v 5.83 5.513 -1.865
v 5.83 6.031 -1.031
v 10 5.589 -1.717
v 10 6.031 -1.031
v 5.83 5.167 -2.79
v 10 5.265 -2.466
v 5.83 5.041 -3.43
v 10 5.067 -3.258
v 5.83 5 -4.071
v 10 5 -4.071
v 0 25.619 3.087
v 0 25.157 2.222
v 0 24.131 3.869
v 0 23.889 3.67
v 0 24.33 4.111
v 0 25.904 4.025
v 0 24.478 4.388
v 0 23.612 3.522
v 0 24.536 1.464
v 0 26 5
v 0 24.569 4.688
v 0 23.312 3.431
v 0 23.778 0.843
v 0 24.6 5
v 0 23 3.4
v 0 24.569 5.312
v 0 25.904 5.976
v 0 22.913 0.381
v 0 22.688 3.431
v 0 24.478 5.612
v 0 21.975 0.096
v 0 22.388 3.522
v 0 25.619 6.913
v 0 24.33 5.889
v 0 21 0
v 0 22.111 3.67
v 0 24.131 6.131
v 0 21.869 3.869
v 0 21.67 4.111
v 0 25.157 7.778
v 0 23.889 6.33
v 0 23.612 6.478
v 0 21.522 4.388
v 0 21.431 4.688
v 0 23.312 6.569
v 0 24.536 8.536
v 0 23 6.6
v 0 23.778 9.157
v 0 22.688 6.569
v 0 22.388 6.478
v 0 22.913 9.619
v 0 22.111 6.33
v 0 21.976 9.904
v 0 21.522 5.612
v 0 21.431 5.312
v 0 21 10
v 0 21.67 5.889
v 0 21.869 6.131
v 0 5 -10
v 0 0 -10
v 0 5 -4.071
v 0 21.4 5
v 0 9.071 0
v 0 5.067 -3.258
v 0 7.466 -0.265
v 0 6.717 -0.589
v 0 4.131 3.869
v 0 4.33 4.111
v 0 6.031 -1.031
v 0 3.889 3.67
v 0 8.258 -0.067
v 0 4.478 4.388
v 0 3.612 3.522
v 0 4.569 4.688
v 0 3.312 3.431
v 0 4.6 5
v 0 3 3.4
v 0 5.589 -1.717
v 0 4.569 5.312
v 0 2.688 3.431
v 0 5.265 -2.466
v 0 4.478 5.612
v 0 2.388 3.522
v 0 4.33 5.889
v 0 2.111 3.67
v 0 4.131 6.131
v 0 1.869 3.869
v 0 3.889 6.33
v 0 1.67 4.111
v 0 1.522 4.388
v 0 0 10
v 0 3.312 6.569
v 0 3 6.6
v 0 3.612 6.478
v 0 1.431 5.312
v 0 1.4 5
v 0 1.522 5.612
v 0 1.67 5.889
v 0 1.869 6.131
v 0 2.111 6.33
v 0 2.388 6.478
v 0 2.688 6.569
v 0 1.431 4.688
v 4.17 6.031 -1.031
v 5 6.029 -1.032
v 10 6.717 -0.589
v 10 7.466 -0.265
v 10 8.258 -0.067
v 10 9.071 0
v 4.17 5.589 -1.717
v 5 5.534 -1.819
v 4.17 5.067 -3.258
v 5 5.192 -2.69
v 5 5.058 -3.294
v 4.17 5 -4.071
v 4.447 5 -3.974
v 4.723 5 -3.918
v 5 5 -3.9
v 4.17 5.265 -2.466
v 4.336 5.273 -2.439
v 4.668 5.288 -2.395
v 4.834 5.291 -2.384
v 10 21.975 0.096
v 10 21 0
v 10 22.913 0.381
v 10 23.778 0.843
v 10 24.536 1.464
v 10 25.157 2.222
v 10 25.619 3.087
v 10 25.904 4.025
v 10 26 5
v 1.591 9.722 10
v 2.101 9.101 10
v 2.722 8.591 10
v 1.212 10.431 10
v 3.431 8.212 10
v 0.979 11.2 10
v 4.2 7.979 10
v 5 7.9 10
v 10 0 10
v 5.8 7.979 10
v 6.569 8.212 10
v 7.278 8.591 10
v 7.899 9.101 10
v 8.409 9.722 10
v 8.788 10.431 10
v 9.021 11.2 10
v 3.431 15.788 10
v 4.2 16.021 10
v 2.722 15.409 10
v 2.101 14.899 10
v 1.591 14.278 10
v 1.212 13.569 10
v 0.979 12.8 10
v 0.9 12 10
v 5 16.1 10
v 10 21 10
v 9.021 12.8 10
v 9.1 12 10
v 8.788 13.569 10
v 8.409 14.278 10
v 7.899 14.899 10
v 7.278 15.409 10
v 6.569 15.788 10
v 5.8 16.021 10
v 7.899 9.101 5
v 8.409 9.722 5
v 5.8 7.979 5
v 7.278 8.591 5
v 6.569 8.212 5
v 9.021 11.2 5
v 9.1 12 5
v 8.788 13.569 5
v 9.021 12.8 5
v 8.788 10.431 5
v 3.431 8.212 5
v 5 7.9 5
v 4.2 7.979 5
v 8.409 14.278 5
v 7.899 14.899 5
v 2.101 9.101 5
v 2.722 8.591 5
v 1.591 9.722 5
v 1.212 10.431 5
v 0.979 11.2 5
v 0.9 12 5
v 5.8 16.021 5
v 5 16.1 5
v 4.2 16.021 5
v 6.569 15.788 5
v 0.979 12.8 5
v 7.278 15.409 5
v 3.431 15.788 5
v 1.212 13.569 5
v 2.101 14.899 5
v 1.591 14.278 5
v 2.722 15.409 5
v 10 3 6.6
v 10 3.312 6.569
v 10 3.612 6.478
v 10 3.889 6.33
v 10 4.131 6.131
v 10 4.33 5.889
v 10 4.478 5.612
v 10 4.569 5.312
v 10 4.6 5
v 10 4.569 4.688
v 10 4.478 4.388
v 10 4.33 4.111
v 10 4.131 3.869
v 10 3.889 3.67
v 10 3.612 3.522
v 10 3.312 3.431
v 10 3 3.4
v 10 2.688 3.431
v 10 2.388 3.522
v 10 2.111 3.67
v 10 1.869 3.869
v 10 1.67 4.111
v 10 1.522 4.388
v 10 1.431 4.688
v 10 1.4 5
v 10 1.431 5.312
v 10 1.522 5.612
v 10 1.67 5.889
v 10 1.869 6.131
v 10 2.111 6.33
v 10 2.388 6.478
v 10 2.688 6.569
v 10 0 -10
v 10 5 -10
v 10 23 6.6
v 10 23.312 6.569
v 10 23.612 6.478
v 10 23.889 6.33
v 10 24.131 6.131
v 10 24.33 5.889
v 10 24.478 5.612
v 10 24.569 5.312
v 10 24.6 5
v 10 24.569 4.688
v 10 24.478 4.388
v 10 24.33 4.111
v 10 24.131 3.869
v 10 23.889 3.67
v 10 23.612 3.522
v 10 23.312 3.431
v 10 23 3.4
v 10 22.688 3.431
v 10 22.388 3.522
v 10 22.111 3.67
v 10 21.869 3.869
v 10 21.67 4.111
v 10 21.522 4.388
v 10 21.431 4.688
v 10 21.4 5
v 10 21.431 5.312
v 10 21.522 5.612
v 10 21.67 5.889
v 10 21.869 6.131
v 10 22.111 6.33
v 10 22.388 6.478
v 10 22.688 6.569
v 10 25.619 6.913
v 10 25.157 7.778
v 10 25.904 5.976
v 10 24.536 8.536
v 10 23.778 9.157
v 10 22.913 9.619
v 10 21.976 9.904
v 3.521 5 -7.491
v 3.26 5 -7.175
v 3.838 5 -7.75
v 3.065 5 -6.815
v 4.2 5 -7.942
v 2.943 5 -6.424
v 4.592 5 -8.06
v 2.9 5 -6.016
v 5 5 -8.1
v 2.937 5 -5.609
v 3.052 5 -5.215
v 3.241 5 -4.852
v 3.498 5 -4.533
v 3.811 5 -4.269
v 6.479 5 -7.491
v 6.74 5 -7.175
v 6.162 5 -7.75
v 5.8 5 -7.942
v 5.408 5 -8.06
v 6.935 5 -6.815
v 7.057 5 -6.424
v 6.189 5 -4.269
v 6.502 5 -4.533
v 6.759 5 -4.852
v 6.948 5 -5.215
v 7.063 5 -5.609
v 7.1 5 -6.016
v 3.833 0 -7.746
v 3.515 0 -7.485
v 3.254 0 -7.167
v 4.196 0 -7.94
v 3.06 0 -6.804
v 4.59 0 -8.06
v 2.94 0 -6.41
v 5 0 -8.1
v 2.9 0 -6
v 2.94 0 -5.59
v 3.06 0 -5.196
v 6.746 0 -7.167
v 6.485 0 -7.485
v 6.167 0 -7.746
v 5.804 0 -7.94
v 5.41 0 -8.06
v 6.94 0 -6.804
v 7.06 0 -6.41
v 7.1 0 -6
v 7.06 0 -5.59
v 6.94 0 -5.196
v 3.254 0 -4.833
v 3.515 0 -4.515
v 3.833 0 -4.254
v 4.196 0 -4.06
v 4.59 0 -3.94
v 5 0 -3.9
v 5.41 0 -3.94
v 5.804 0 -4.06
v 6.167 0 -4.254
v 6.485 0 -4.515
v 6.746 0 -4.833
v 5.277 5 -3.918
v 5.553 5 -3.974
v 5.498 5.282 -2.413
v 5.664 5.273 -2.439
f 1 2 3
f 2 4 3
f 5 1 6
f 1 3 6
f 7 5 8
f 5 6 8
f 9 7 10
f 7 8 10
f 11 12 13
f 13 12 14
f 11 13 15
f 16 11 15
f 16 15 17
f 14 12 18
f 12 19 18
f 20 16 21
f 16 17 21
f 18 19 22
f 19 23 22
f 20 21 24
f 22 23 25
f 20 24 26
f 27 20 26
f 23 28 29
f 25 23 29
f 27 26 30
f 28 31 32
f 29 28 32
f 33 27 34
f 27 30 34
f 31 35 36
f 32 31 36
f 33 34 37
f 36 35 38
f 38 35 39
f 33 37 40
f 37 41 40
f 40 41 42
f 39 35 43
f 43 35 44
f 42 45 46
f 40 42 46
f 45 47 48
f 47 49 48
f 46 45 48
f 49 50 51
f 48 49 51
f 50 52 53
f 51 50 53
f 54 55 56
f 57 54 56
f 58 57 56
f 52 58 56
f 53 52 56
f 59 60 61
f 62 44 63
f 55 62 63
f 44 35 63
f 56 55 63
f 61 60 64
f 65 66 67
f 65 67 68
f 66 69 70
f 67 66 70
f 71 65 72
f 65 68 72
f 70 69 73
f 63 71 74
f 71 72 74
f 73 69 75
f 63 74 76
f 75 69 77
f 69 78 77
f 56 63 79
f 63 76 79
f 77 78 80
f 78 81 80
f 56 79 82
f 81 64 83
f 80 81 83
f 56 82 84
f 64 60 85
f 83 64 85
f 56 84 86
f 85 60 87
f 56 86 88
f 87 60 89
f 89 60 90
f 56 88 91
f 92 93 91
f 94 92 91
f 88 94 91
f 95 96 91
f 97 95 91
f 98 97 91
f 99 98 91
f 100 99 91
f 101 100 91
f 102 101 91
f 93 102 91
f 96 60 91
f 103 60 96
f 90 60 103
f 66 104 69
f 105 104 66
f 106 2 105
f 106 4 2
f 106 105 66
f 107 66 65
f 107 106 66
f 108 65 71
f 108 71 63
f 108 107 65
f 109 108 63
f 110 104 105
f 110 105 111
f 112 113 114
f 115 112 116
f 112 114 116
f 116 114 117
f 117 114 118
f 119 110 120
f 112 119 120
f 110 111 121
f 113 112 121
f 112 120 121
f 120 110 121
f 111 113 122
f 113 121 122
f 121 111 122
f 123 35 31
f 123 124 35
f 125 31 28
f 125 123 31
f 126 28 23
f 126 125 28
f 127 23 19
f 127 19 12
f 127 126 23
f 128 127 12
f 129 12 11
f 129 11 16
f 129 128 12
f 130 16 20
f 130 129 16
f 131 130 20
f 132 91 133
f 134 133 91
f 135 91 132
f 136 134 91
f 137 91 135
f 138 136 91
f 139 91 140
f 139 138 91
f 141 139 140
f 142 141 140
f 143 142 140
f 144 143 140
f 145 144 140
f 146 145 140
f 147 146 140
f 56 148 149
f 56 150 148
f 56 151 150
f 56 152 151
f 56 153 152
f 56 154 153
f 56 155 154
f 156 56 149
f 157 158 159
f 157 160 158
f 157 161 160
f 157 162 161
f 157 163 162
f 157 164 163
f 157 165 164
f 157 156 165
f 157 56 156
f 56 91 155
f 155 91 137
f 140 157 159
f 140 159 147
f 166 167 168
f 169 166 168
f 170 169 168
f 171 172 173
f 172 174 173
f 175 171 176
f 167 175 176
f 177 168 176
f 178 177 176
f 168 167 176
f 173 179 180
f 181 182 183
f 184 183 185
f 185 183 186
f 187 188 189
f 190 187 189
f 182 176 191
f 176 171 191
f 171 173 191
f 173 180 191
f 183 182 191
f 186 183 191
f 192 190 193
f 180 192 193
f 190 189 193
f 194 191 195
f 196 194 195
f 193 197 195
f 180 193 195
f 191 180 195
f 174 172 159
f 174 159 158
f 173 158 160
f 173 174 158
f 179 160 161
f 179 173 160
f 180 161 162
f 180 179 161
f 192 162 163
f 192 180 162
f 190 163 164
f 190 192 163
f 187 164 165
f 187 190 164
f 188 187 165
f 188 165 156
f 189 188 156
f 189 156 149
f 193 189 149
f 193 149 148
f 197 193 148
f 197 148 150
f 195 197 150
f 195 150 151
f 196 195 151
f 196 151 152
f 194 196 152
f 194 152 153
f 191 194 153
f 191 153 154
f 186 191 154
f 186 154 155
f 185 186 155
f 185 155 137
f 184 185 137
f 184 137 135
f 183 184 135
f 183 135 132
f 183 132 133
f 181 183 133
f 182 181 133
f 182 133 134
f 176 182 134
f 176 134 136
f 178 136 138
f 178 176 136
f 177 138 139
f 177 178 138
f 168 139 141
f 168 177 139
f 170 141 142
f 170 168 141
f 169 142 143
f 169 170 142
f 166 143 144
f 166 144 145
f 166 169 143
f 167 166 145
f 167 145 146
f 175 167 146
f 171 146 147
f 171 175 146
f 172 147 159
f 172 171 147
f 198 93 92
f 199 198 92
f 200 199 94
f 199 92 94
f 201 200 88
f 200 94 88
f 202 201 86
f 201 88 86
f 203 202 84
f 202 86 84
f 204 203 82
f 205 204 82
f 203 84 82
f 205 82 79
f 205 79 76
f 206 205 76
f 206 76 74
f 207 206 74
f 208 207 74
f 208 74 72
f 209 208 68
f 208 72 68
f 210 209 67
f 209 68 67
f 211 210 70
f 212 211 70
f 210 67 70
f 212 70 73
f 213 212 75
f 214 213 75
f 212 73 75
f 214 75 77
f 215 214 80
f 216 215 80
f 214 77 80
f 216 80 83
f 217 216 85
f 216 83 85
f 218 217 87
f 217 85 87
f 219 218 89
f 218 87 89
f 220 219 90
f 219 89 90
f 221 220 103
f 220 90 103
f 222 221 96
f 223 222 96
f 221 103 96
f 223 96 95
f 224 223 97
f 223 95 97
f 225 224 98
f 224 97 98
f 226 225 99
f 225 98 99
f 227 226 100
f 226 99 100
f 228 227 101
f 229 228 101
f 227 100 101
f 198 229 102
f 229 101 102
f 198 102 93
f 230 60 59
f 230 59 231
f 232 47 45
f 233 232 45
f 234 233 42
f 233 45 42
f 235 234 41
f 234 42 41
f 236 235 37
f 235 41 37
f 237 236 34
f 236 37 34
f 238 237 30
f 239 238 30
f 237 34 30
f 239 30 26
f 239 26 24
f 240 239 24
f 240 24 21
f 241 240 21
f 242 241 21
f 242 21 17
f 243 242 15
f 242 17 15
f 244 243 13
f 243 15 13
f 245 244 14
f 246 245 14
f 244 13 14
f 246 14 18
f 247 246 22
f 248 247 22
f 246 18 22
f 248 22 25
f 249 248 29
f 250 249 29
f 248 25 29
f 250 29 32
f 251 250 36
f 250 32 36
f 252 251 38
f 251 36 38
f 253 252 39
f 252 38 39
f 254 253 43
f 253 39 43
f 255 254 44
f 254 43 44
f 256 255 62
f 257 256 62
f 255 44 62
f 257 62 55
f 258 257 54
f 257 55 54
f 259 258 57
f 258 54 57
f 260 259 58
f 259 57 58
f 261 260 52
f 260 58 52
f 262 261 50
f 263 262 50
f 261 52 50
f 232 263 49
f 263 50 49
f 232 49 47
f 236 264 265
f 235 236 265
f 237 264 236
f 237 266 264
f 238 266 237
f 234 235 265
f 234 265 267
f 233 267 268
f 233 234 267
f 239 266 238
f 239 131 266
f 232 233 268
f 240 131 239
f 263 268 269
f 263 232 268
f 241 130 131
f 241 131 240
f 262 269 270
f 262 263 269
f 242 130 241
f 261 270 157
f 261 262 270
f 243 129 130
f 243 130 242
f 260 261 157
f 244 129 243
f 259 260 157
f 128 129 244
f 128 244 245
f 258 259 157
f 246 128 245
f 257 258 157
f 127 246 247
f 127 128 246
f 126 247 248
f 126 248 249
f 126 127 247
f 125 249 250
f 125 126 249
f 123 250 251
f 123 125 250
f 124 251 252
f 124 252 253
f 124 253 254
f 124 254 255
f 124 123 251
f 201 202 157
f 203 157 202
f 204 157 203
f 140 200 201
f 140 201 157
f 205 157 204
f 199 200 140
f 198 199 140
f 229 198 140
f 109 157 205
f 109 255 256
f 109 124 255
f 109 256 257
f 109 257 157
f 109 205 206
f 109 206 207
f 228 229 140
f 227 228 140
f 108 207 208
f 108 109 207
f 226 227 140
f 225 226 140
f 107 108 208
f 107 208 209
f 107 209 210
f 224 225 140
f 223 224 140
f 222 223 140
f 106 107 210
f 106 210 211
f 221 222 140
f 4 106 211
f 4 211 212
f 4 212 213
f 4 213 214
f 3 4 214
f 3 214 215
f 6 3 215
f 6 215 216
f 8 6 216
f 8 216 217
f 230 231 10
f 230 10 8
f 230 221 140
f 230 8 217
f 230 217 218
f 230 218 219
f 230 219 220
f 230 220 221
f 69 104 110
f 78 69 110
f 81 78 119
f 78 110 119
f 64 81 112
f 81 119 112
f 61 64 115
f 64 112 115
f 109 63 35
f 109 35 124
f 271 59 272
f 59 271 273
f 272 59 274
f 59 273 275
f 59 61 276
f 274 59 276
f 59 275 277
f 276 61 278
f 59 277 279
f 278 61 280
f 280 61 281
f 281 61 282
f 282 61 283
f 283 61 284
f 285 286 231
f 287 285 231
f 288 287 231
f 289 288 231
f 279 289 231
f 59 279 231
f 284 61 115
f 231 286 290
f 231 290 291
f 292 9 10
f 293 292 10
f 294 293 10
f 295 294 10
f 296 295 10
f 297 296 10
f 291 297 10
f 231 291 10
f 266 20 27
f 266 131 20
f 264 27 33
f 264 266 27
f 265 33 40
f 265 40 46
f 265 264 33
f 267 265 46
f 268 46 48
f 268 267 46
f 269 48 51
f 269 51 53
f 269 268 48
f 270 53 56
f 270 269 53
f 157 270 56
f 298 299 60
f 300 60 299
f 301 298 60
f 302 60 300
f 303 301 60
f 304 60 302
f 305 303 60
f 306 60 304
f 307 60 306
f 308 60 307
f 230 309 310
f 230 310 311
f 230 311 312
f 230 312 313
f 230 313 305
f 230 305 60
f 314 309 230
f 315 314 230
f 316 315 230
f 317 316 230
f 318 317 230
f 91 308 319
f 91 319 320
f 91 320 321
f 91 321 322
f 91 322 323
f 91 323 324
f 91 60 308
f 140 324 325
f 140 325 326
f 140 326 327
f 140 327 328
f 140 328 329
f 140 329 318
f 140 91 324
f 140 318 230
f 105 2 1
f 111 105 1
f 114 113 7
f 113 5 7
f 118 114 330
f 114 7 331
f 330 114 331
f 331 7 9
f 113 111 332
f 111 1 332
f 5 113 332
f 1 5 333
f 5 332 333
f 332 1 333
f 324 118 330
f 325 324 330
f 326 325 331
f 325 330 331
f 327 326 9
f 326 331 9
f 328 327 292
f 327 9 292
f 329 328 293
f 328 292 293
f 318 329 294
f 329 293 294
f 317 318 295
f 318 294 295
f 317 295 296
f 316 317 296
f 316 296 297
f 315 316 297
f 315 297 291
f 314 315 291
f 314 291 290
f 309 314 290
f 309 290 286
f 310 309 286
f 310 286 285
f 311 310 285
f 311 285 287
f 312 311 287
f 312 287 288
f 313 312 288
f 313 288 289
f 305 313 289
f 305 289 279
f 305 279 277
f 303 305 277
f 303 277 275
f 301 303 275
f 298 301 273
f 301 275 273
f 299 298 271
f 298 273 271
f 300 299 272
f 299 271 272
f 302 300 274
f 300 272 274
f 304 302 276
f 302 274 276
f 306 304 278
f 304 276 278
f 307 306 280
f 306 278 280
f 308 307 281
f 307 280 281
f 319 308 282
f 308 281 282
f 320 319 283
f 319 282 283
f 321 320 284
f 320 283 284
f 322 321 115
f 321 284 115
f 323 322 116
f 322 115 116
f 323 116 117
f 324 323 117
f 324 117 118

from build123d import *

# Parameters (mm, degrees)
ESQUISSE1_W             = 10
ESQUISSE1_H             = 26
ESQUISSE1_R             = 4.1
BOSS_EXTRU_1_DEPTH      = 10
ESQUISSE2_R             = 1.6
ENL_V_MAT_EXTRU_1_DEPTH = 10
ESQUISSE3_W             = 10
ESQUISSE3_H             = 10
BOSS_EXTRU_2_DEPTH      = 5
CHANFREIN1_SIZE         = 2
ESQUISSE4_R             = 2.1
ENL_V_MAT_EXTRU_2_DEPTH = 5
ESQUISSE5_R             = 4.106671815
BOSS_EXTRU_3_DEPTH      = 5
CONG_1_R                = 5


# Some blends are built 0.0001 mm under size
with BuildPart() as part:
    # Esquisse1 → Boss.-Extru.1 (new body)
    with BuildSketch(Plane.XY):
        with Locations((5, 13)):
            Rectangle(ESQUISSE1_W, ESQUISSE1_H)
        with Locations((5, 12)):
            Circle(ESQUISSE1_R, mode=Mode.SUBTRACT)
    extrude(amount=BOSS_EXTRU_1_DEPTH)

    # Esquisse2 → Enlèv. mat.-Extru.1 (cut)
    with BuildSketch(Plane.ZY):
        with Locations((5, 23)):
            Circle(ESQUISSE2_R)
        with Locations((5, 3)):
            Circle(ESQUISSE2_R)
    extrude(amount=-ENL_V_MAT_EXTRU_1_DEPTH, mode=Mode.SUBTRACT)

    # Esquisse3 → Boss.-Extru.2 (add)
    with BuildSketch(Plane.XZ):
        with Locations((5, -5)):
            Rectangle(ESQUISSE3_W, ESQUISSE3_H)
    extrude(amount=-BOSS_EXTRU_2_DEPTH)

    # Chanfrein1
    chanfrein1_edges = [part.edges().sort_by_distance(p)[0] for p in [
        (5, 5, 0),
    ]]
    chamfer(chanfrein1_edges, length=CHANFREIN1_SIZE)

    # Esquisse4 → Enlèv. mat.-Extru.2 (cut)
    with BuildSketch(Plane(origin=(0, 5, 0), x_dir=(1, 0, 0), z_dir=(0, 1, 0))):
        with Locations(Location((5, 6, 0), (0, 0, 270))):
            Circle(ESQUISSE4_R)
    extrude(amount=-ENL_V_MAT_EXTRU_2_DEPTH, mode=Mode.SUBTRACT)

    # Esquisse5 → Boss.-Extru.3 (add)
    with BuildSketch(Plane(origin=(0, 0, 0), x_dir=(-1, 0, 0), z_dir=(0, 0, -1))):
        with Locations((-5, 12)):
            Circle(ESQUISSE5_R)
    extrude(amount=-BOSS_EXTRU_3_DEPTH)

    # Congé1
    cong_1_edges = [part.edges().sort_by_distance(p)[0] for p in [
        (5, 5, -2),
    ]]
    fillet(cong_1_edges, radius=CONG_1_R)
    cong_1_2_edges = [part.edges().sort_by_distance(p)[0] for p in [
        (5, 26, 0),
    ]]
    fillet(cong_1_2_edges, radius=CONG_1_R)
    cong_1_3_edges = [part.edges().sort_by_distance(p)[0] for p in [
        (5, 26, 10),
    ]]
    fillet(cong_1_3_edges, radius=CONG_1_R - 0.0001)  # a hair under: the kernel refuses the full size
    # the kernel refuses this fillet: 5 mm, written as the material it adds along each edge
    with BuildSketch(Plane(origin=(10, 7, 0), x_dir=(0, 1, 0), z_dir=(-1, 0, 0))) as cong_1_4_piece_1:
        with BuildLine():
            CenterArc((CONG_1_R * 0.414213562373, CONG_1_R), CONG_1_R, 225, 45)
            Line((-CONG_1_R * 0.292893218813, CONG_1_R * 0.292893218813), (-CONG_1_R * 0.307035354437, CONG_1_R * 0.27875108319))
            Line((-CONG_1_R * 0.307035354437, CONG_1_R * 0.27875108319), (-CONG_1_R * 0.00828427124746, -CONG_1_R * 0.02))
            Line((-CONG_1_R * 0.00828427124746, -CONG_1_R * 0.02), (CONG_1_R * 0.414213562373, -CONG_1_R * 0.02))
            Line((CONG_1_R * 0.414213562373, -CONG_1_R * 0.02), (CONG_1_R * 0.414213562373, 0))
        make_face()
    extrude(amount=10)


solid = part.part
